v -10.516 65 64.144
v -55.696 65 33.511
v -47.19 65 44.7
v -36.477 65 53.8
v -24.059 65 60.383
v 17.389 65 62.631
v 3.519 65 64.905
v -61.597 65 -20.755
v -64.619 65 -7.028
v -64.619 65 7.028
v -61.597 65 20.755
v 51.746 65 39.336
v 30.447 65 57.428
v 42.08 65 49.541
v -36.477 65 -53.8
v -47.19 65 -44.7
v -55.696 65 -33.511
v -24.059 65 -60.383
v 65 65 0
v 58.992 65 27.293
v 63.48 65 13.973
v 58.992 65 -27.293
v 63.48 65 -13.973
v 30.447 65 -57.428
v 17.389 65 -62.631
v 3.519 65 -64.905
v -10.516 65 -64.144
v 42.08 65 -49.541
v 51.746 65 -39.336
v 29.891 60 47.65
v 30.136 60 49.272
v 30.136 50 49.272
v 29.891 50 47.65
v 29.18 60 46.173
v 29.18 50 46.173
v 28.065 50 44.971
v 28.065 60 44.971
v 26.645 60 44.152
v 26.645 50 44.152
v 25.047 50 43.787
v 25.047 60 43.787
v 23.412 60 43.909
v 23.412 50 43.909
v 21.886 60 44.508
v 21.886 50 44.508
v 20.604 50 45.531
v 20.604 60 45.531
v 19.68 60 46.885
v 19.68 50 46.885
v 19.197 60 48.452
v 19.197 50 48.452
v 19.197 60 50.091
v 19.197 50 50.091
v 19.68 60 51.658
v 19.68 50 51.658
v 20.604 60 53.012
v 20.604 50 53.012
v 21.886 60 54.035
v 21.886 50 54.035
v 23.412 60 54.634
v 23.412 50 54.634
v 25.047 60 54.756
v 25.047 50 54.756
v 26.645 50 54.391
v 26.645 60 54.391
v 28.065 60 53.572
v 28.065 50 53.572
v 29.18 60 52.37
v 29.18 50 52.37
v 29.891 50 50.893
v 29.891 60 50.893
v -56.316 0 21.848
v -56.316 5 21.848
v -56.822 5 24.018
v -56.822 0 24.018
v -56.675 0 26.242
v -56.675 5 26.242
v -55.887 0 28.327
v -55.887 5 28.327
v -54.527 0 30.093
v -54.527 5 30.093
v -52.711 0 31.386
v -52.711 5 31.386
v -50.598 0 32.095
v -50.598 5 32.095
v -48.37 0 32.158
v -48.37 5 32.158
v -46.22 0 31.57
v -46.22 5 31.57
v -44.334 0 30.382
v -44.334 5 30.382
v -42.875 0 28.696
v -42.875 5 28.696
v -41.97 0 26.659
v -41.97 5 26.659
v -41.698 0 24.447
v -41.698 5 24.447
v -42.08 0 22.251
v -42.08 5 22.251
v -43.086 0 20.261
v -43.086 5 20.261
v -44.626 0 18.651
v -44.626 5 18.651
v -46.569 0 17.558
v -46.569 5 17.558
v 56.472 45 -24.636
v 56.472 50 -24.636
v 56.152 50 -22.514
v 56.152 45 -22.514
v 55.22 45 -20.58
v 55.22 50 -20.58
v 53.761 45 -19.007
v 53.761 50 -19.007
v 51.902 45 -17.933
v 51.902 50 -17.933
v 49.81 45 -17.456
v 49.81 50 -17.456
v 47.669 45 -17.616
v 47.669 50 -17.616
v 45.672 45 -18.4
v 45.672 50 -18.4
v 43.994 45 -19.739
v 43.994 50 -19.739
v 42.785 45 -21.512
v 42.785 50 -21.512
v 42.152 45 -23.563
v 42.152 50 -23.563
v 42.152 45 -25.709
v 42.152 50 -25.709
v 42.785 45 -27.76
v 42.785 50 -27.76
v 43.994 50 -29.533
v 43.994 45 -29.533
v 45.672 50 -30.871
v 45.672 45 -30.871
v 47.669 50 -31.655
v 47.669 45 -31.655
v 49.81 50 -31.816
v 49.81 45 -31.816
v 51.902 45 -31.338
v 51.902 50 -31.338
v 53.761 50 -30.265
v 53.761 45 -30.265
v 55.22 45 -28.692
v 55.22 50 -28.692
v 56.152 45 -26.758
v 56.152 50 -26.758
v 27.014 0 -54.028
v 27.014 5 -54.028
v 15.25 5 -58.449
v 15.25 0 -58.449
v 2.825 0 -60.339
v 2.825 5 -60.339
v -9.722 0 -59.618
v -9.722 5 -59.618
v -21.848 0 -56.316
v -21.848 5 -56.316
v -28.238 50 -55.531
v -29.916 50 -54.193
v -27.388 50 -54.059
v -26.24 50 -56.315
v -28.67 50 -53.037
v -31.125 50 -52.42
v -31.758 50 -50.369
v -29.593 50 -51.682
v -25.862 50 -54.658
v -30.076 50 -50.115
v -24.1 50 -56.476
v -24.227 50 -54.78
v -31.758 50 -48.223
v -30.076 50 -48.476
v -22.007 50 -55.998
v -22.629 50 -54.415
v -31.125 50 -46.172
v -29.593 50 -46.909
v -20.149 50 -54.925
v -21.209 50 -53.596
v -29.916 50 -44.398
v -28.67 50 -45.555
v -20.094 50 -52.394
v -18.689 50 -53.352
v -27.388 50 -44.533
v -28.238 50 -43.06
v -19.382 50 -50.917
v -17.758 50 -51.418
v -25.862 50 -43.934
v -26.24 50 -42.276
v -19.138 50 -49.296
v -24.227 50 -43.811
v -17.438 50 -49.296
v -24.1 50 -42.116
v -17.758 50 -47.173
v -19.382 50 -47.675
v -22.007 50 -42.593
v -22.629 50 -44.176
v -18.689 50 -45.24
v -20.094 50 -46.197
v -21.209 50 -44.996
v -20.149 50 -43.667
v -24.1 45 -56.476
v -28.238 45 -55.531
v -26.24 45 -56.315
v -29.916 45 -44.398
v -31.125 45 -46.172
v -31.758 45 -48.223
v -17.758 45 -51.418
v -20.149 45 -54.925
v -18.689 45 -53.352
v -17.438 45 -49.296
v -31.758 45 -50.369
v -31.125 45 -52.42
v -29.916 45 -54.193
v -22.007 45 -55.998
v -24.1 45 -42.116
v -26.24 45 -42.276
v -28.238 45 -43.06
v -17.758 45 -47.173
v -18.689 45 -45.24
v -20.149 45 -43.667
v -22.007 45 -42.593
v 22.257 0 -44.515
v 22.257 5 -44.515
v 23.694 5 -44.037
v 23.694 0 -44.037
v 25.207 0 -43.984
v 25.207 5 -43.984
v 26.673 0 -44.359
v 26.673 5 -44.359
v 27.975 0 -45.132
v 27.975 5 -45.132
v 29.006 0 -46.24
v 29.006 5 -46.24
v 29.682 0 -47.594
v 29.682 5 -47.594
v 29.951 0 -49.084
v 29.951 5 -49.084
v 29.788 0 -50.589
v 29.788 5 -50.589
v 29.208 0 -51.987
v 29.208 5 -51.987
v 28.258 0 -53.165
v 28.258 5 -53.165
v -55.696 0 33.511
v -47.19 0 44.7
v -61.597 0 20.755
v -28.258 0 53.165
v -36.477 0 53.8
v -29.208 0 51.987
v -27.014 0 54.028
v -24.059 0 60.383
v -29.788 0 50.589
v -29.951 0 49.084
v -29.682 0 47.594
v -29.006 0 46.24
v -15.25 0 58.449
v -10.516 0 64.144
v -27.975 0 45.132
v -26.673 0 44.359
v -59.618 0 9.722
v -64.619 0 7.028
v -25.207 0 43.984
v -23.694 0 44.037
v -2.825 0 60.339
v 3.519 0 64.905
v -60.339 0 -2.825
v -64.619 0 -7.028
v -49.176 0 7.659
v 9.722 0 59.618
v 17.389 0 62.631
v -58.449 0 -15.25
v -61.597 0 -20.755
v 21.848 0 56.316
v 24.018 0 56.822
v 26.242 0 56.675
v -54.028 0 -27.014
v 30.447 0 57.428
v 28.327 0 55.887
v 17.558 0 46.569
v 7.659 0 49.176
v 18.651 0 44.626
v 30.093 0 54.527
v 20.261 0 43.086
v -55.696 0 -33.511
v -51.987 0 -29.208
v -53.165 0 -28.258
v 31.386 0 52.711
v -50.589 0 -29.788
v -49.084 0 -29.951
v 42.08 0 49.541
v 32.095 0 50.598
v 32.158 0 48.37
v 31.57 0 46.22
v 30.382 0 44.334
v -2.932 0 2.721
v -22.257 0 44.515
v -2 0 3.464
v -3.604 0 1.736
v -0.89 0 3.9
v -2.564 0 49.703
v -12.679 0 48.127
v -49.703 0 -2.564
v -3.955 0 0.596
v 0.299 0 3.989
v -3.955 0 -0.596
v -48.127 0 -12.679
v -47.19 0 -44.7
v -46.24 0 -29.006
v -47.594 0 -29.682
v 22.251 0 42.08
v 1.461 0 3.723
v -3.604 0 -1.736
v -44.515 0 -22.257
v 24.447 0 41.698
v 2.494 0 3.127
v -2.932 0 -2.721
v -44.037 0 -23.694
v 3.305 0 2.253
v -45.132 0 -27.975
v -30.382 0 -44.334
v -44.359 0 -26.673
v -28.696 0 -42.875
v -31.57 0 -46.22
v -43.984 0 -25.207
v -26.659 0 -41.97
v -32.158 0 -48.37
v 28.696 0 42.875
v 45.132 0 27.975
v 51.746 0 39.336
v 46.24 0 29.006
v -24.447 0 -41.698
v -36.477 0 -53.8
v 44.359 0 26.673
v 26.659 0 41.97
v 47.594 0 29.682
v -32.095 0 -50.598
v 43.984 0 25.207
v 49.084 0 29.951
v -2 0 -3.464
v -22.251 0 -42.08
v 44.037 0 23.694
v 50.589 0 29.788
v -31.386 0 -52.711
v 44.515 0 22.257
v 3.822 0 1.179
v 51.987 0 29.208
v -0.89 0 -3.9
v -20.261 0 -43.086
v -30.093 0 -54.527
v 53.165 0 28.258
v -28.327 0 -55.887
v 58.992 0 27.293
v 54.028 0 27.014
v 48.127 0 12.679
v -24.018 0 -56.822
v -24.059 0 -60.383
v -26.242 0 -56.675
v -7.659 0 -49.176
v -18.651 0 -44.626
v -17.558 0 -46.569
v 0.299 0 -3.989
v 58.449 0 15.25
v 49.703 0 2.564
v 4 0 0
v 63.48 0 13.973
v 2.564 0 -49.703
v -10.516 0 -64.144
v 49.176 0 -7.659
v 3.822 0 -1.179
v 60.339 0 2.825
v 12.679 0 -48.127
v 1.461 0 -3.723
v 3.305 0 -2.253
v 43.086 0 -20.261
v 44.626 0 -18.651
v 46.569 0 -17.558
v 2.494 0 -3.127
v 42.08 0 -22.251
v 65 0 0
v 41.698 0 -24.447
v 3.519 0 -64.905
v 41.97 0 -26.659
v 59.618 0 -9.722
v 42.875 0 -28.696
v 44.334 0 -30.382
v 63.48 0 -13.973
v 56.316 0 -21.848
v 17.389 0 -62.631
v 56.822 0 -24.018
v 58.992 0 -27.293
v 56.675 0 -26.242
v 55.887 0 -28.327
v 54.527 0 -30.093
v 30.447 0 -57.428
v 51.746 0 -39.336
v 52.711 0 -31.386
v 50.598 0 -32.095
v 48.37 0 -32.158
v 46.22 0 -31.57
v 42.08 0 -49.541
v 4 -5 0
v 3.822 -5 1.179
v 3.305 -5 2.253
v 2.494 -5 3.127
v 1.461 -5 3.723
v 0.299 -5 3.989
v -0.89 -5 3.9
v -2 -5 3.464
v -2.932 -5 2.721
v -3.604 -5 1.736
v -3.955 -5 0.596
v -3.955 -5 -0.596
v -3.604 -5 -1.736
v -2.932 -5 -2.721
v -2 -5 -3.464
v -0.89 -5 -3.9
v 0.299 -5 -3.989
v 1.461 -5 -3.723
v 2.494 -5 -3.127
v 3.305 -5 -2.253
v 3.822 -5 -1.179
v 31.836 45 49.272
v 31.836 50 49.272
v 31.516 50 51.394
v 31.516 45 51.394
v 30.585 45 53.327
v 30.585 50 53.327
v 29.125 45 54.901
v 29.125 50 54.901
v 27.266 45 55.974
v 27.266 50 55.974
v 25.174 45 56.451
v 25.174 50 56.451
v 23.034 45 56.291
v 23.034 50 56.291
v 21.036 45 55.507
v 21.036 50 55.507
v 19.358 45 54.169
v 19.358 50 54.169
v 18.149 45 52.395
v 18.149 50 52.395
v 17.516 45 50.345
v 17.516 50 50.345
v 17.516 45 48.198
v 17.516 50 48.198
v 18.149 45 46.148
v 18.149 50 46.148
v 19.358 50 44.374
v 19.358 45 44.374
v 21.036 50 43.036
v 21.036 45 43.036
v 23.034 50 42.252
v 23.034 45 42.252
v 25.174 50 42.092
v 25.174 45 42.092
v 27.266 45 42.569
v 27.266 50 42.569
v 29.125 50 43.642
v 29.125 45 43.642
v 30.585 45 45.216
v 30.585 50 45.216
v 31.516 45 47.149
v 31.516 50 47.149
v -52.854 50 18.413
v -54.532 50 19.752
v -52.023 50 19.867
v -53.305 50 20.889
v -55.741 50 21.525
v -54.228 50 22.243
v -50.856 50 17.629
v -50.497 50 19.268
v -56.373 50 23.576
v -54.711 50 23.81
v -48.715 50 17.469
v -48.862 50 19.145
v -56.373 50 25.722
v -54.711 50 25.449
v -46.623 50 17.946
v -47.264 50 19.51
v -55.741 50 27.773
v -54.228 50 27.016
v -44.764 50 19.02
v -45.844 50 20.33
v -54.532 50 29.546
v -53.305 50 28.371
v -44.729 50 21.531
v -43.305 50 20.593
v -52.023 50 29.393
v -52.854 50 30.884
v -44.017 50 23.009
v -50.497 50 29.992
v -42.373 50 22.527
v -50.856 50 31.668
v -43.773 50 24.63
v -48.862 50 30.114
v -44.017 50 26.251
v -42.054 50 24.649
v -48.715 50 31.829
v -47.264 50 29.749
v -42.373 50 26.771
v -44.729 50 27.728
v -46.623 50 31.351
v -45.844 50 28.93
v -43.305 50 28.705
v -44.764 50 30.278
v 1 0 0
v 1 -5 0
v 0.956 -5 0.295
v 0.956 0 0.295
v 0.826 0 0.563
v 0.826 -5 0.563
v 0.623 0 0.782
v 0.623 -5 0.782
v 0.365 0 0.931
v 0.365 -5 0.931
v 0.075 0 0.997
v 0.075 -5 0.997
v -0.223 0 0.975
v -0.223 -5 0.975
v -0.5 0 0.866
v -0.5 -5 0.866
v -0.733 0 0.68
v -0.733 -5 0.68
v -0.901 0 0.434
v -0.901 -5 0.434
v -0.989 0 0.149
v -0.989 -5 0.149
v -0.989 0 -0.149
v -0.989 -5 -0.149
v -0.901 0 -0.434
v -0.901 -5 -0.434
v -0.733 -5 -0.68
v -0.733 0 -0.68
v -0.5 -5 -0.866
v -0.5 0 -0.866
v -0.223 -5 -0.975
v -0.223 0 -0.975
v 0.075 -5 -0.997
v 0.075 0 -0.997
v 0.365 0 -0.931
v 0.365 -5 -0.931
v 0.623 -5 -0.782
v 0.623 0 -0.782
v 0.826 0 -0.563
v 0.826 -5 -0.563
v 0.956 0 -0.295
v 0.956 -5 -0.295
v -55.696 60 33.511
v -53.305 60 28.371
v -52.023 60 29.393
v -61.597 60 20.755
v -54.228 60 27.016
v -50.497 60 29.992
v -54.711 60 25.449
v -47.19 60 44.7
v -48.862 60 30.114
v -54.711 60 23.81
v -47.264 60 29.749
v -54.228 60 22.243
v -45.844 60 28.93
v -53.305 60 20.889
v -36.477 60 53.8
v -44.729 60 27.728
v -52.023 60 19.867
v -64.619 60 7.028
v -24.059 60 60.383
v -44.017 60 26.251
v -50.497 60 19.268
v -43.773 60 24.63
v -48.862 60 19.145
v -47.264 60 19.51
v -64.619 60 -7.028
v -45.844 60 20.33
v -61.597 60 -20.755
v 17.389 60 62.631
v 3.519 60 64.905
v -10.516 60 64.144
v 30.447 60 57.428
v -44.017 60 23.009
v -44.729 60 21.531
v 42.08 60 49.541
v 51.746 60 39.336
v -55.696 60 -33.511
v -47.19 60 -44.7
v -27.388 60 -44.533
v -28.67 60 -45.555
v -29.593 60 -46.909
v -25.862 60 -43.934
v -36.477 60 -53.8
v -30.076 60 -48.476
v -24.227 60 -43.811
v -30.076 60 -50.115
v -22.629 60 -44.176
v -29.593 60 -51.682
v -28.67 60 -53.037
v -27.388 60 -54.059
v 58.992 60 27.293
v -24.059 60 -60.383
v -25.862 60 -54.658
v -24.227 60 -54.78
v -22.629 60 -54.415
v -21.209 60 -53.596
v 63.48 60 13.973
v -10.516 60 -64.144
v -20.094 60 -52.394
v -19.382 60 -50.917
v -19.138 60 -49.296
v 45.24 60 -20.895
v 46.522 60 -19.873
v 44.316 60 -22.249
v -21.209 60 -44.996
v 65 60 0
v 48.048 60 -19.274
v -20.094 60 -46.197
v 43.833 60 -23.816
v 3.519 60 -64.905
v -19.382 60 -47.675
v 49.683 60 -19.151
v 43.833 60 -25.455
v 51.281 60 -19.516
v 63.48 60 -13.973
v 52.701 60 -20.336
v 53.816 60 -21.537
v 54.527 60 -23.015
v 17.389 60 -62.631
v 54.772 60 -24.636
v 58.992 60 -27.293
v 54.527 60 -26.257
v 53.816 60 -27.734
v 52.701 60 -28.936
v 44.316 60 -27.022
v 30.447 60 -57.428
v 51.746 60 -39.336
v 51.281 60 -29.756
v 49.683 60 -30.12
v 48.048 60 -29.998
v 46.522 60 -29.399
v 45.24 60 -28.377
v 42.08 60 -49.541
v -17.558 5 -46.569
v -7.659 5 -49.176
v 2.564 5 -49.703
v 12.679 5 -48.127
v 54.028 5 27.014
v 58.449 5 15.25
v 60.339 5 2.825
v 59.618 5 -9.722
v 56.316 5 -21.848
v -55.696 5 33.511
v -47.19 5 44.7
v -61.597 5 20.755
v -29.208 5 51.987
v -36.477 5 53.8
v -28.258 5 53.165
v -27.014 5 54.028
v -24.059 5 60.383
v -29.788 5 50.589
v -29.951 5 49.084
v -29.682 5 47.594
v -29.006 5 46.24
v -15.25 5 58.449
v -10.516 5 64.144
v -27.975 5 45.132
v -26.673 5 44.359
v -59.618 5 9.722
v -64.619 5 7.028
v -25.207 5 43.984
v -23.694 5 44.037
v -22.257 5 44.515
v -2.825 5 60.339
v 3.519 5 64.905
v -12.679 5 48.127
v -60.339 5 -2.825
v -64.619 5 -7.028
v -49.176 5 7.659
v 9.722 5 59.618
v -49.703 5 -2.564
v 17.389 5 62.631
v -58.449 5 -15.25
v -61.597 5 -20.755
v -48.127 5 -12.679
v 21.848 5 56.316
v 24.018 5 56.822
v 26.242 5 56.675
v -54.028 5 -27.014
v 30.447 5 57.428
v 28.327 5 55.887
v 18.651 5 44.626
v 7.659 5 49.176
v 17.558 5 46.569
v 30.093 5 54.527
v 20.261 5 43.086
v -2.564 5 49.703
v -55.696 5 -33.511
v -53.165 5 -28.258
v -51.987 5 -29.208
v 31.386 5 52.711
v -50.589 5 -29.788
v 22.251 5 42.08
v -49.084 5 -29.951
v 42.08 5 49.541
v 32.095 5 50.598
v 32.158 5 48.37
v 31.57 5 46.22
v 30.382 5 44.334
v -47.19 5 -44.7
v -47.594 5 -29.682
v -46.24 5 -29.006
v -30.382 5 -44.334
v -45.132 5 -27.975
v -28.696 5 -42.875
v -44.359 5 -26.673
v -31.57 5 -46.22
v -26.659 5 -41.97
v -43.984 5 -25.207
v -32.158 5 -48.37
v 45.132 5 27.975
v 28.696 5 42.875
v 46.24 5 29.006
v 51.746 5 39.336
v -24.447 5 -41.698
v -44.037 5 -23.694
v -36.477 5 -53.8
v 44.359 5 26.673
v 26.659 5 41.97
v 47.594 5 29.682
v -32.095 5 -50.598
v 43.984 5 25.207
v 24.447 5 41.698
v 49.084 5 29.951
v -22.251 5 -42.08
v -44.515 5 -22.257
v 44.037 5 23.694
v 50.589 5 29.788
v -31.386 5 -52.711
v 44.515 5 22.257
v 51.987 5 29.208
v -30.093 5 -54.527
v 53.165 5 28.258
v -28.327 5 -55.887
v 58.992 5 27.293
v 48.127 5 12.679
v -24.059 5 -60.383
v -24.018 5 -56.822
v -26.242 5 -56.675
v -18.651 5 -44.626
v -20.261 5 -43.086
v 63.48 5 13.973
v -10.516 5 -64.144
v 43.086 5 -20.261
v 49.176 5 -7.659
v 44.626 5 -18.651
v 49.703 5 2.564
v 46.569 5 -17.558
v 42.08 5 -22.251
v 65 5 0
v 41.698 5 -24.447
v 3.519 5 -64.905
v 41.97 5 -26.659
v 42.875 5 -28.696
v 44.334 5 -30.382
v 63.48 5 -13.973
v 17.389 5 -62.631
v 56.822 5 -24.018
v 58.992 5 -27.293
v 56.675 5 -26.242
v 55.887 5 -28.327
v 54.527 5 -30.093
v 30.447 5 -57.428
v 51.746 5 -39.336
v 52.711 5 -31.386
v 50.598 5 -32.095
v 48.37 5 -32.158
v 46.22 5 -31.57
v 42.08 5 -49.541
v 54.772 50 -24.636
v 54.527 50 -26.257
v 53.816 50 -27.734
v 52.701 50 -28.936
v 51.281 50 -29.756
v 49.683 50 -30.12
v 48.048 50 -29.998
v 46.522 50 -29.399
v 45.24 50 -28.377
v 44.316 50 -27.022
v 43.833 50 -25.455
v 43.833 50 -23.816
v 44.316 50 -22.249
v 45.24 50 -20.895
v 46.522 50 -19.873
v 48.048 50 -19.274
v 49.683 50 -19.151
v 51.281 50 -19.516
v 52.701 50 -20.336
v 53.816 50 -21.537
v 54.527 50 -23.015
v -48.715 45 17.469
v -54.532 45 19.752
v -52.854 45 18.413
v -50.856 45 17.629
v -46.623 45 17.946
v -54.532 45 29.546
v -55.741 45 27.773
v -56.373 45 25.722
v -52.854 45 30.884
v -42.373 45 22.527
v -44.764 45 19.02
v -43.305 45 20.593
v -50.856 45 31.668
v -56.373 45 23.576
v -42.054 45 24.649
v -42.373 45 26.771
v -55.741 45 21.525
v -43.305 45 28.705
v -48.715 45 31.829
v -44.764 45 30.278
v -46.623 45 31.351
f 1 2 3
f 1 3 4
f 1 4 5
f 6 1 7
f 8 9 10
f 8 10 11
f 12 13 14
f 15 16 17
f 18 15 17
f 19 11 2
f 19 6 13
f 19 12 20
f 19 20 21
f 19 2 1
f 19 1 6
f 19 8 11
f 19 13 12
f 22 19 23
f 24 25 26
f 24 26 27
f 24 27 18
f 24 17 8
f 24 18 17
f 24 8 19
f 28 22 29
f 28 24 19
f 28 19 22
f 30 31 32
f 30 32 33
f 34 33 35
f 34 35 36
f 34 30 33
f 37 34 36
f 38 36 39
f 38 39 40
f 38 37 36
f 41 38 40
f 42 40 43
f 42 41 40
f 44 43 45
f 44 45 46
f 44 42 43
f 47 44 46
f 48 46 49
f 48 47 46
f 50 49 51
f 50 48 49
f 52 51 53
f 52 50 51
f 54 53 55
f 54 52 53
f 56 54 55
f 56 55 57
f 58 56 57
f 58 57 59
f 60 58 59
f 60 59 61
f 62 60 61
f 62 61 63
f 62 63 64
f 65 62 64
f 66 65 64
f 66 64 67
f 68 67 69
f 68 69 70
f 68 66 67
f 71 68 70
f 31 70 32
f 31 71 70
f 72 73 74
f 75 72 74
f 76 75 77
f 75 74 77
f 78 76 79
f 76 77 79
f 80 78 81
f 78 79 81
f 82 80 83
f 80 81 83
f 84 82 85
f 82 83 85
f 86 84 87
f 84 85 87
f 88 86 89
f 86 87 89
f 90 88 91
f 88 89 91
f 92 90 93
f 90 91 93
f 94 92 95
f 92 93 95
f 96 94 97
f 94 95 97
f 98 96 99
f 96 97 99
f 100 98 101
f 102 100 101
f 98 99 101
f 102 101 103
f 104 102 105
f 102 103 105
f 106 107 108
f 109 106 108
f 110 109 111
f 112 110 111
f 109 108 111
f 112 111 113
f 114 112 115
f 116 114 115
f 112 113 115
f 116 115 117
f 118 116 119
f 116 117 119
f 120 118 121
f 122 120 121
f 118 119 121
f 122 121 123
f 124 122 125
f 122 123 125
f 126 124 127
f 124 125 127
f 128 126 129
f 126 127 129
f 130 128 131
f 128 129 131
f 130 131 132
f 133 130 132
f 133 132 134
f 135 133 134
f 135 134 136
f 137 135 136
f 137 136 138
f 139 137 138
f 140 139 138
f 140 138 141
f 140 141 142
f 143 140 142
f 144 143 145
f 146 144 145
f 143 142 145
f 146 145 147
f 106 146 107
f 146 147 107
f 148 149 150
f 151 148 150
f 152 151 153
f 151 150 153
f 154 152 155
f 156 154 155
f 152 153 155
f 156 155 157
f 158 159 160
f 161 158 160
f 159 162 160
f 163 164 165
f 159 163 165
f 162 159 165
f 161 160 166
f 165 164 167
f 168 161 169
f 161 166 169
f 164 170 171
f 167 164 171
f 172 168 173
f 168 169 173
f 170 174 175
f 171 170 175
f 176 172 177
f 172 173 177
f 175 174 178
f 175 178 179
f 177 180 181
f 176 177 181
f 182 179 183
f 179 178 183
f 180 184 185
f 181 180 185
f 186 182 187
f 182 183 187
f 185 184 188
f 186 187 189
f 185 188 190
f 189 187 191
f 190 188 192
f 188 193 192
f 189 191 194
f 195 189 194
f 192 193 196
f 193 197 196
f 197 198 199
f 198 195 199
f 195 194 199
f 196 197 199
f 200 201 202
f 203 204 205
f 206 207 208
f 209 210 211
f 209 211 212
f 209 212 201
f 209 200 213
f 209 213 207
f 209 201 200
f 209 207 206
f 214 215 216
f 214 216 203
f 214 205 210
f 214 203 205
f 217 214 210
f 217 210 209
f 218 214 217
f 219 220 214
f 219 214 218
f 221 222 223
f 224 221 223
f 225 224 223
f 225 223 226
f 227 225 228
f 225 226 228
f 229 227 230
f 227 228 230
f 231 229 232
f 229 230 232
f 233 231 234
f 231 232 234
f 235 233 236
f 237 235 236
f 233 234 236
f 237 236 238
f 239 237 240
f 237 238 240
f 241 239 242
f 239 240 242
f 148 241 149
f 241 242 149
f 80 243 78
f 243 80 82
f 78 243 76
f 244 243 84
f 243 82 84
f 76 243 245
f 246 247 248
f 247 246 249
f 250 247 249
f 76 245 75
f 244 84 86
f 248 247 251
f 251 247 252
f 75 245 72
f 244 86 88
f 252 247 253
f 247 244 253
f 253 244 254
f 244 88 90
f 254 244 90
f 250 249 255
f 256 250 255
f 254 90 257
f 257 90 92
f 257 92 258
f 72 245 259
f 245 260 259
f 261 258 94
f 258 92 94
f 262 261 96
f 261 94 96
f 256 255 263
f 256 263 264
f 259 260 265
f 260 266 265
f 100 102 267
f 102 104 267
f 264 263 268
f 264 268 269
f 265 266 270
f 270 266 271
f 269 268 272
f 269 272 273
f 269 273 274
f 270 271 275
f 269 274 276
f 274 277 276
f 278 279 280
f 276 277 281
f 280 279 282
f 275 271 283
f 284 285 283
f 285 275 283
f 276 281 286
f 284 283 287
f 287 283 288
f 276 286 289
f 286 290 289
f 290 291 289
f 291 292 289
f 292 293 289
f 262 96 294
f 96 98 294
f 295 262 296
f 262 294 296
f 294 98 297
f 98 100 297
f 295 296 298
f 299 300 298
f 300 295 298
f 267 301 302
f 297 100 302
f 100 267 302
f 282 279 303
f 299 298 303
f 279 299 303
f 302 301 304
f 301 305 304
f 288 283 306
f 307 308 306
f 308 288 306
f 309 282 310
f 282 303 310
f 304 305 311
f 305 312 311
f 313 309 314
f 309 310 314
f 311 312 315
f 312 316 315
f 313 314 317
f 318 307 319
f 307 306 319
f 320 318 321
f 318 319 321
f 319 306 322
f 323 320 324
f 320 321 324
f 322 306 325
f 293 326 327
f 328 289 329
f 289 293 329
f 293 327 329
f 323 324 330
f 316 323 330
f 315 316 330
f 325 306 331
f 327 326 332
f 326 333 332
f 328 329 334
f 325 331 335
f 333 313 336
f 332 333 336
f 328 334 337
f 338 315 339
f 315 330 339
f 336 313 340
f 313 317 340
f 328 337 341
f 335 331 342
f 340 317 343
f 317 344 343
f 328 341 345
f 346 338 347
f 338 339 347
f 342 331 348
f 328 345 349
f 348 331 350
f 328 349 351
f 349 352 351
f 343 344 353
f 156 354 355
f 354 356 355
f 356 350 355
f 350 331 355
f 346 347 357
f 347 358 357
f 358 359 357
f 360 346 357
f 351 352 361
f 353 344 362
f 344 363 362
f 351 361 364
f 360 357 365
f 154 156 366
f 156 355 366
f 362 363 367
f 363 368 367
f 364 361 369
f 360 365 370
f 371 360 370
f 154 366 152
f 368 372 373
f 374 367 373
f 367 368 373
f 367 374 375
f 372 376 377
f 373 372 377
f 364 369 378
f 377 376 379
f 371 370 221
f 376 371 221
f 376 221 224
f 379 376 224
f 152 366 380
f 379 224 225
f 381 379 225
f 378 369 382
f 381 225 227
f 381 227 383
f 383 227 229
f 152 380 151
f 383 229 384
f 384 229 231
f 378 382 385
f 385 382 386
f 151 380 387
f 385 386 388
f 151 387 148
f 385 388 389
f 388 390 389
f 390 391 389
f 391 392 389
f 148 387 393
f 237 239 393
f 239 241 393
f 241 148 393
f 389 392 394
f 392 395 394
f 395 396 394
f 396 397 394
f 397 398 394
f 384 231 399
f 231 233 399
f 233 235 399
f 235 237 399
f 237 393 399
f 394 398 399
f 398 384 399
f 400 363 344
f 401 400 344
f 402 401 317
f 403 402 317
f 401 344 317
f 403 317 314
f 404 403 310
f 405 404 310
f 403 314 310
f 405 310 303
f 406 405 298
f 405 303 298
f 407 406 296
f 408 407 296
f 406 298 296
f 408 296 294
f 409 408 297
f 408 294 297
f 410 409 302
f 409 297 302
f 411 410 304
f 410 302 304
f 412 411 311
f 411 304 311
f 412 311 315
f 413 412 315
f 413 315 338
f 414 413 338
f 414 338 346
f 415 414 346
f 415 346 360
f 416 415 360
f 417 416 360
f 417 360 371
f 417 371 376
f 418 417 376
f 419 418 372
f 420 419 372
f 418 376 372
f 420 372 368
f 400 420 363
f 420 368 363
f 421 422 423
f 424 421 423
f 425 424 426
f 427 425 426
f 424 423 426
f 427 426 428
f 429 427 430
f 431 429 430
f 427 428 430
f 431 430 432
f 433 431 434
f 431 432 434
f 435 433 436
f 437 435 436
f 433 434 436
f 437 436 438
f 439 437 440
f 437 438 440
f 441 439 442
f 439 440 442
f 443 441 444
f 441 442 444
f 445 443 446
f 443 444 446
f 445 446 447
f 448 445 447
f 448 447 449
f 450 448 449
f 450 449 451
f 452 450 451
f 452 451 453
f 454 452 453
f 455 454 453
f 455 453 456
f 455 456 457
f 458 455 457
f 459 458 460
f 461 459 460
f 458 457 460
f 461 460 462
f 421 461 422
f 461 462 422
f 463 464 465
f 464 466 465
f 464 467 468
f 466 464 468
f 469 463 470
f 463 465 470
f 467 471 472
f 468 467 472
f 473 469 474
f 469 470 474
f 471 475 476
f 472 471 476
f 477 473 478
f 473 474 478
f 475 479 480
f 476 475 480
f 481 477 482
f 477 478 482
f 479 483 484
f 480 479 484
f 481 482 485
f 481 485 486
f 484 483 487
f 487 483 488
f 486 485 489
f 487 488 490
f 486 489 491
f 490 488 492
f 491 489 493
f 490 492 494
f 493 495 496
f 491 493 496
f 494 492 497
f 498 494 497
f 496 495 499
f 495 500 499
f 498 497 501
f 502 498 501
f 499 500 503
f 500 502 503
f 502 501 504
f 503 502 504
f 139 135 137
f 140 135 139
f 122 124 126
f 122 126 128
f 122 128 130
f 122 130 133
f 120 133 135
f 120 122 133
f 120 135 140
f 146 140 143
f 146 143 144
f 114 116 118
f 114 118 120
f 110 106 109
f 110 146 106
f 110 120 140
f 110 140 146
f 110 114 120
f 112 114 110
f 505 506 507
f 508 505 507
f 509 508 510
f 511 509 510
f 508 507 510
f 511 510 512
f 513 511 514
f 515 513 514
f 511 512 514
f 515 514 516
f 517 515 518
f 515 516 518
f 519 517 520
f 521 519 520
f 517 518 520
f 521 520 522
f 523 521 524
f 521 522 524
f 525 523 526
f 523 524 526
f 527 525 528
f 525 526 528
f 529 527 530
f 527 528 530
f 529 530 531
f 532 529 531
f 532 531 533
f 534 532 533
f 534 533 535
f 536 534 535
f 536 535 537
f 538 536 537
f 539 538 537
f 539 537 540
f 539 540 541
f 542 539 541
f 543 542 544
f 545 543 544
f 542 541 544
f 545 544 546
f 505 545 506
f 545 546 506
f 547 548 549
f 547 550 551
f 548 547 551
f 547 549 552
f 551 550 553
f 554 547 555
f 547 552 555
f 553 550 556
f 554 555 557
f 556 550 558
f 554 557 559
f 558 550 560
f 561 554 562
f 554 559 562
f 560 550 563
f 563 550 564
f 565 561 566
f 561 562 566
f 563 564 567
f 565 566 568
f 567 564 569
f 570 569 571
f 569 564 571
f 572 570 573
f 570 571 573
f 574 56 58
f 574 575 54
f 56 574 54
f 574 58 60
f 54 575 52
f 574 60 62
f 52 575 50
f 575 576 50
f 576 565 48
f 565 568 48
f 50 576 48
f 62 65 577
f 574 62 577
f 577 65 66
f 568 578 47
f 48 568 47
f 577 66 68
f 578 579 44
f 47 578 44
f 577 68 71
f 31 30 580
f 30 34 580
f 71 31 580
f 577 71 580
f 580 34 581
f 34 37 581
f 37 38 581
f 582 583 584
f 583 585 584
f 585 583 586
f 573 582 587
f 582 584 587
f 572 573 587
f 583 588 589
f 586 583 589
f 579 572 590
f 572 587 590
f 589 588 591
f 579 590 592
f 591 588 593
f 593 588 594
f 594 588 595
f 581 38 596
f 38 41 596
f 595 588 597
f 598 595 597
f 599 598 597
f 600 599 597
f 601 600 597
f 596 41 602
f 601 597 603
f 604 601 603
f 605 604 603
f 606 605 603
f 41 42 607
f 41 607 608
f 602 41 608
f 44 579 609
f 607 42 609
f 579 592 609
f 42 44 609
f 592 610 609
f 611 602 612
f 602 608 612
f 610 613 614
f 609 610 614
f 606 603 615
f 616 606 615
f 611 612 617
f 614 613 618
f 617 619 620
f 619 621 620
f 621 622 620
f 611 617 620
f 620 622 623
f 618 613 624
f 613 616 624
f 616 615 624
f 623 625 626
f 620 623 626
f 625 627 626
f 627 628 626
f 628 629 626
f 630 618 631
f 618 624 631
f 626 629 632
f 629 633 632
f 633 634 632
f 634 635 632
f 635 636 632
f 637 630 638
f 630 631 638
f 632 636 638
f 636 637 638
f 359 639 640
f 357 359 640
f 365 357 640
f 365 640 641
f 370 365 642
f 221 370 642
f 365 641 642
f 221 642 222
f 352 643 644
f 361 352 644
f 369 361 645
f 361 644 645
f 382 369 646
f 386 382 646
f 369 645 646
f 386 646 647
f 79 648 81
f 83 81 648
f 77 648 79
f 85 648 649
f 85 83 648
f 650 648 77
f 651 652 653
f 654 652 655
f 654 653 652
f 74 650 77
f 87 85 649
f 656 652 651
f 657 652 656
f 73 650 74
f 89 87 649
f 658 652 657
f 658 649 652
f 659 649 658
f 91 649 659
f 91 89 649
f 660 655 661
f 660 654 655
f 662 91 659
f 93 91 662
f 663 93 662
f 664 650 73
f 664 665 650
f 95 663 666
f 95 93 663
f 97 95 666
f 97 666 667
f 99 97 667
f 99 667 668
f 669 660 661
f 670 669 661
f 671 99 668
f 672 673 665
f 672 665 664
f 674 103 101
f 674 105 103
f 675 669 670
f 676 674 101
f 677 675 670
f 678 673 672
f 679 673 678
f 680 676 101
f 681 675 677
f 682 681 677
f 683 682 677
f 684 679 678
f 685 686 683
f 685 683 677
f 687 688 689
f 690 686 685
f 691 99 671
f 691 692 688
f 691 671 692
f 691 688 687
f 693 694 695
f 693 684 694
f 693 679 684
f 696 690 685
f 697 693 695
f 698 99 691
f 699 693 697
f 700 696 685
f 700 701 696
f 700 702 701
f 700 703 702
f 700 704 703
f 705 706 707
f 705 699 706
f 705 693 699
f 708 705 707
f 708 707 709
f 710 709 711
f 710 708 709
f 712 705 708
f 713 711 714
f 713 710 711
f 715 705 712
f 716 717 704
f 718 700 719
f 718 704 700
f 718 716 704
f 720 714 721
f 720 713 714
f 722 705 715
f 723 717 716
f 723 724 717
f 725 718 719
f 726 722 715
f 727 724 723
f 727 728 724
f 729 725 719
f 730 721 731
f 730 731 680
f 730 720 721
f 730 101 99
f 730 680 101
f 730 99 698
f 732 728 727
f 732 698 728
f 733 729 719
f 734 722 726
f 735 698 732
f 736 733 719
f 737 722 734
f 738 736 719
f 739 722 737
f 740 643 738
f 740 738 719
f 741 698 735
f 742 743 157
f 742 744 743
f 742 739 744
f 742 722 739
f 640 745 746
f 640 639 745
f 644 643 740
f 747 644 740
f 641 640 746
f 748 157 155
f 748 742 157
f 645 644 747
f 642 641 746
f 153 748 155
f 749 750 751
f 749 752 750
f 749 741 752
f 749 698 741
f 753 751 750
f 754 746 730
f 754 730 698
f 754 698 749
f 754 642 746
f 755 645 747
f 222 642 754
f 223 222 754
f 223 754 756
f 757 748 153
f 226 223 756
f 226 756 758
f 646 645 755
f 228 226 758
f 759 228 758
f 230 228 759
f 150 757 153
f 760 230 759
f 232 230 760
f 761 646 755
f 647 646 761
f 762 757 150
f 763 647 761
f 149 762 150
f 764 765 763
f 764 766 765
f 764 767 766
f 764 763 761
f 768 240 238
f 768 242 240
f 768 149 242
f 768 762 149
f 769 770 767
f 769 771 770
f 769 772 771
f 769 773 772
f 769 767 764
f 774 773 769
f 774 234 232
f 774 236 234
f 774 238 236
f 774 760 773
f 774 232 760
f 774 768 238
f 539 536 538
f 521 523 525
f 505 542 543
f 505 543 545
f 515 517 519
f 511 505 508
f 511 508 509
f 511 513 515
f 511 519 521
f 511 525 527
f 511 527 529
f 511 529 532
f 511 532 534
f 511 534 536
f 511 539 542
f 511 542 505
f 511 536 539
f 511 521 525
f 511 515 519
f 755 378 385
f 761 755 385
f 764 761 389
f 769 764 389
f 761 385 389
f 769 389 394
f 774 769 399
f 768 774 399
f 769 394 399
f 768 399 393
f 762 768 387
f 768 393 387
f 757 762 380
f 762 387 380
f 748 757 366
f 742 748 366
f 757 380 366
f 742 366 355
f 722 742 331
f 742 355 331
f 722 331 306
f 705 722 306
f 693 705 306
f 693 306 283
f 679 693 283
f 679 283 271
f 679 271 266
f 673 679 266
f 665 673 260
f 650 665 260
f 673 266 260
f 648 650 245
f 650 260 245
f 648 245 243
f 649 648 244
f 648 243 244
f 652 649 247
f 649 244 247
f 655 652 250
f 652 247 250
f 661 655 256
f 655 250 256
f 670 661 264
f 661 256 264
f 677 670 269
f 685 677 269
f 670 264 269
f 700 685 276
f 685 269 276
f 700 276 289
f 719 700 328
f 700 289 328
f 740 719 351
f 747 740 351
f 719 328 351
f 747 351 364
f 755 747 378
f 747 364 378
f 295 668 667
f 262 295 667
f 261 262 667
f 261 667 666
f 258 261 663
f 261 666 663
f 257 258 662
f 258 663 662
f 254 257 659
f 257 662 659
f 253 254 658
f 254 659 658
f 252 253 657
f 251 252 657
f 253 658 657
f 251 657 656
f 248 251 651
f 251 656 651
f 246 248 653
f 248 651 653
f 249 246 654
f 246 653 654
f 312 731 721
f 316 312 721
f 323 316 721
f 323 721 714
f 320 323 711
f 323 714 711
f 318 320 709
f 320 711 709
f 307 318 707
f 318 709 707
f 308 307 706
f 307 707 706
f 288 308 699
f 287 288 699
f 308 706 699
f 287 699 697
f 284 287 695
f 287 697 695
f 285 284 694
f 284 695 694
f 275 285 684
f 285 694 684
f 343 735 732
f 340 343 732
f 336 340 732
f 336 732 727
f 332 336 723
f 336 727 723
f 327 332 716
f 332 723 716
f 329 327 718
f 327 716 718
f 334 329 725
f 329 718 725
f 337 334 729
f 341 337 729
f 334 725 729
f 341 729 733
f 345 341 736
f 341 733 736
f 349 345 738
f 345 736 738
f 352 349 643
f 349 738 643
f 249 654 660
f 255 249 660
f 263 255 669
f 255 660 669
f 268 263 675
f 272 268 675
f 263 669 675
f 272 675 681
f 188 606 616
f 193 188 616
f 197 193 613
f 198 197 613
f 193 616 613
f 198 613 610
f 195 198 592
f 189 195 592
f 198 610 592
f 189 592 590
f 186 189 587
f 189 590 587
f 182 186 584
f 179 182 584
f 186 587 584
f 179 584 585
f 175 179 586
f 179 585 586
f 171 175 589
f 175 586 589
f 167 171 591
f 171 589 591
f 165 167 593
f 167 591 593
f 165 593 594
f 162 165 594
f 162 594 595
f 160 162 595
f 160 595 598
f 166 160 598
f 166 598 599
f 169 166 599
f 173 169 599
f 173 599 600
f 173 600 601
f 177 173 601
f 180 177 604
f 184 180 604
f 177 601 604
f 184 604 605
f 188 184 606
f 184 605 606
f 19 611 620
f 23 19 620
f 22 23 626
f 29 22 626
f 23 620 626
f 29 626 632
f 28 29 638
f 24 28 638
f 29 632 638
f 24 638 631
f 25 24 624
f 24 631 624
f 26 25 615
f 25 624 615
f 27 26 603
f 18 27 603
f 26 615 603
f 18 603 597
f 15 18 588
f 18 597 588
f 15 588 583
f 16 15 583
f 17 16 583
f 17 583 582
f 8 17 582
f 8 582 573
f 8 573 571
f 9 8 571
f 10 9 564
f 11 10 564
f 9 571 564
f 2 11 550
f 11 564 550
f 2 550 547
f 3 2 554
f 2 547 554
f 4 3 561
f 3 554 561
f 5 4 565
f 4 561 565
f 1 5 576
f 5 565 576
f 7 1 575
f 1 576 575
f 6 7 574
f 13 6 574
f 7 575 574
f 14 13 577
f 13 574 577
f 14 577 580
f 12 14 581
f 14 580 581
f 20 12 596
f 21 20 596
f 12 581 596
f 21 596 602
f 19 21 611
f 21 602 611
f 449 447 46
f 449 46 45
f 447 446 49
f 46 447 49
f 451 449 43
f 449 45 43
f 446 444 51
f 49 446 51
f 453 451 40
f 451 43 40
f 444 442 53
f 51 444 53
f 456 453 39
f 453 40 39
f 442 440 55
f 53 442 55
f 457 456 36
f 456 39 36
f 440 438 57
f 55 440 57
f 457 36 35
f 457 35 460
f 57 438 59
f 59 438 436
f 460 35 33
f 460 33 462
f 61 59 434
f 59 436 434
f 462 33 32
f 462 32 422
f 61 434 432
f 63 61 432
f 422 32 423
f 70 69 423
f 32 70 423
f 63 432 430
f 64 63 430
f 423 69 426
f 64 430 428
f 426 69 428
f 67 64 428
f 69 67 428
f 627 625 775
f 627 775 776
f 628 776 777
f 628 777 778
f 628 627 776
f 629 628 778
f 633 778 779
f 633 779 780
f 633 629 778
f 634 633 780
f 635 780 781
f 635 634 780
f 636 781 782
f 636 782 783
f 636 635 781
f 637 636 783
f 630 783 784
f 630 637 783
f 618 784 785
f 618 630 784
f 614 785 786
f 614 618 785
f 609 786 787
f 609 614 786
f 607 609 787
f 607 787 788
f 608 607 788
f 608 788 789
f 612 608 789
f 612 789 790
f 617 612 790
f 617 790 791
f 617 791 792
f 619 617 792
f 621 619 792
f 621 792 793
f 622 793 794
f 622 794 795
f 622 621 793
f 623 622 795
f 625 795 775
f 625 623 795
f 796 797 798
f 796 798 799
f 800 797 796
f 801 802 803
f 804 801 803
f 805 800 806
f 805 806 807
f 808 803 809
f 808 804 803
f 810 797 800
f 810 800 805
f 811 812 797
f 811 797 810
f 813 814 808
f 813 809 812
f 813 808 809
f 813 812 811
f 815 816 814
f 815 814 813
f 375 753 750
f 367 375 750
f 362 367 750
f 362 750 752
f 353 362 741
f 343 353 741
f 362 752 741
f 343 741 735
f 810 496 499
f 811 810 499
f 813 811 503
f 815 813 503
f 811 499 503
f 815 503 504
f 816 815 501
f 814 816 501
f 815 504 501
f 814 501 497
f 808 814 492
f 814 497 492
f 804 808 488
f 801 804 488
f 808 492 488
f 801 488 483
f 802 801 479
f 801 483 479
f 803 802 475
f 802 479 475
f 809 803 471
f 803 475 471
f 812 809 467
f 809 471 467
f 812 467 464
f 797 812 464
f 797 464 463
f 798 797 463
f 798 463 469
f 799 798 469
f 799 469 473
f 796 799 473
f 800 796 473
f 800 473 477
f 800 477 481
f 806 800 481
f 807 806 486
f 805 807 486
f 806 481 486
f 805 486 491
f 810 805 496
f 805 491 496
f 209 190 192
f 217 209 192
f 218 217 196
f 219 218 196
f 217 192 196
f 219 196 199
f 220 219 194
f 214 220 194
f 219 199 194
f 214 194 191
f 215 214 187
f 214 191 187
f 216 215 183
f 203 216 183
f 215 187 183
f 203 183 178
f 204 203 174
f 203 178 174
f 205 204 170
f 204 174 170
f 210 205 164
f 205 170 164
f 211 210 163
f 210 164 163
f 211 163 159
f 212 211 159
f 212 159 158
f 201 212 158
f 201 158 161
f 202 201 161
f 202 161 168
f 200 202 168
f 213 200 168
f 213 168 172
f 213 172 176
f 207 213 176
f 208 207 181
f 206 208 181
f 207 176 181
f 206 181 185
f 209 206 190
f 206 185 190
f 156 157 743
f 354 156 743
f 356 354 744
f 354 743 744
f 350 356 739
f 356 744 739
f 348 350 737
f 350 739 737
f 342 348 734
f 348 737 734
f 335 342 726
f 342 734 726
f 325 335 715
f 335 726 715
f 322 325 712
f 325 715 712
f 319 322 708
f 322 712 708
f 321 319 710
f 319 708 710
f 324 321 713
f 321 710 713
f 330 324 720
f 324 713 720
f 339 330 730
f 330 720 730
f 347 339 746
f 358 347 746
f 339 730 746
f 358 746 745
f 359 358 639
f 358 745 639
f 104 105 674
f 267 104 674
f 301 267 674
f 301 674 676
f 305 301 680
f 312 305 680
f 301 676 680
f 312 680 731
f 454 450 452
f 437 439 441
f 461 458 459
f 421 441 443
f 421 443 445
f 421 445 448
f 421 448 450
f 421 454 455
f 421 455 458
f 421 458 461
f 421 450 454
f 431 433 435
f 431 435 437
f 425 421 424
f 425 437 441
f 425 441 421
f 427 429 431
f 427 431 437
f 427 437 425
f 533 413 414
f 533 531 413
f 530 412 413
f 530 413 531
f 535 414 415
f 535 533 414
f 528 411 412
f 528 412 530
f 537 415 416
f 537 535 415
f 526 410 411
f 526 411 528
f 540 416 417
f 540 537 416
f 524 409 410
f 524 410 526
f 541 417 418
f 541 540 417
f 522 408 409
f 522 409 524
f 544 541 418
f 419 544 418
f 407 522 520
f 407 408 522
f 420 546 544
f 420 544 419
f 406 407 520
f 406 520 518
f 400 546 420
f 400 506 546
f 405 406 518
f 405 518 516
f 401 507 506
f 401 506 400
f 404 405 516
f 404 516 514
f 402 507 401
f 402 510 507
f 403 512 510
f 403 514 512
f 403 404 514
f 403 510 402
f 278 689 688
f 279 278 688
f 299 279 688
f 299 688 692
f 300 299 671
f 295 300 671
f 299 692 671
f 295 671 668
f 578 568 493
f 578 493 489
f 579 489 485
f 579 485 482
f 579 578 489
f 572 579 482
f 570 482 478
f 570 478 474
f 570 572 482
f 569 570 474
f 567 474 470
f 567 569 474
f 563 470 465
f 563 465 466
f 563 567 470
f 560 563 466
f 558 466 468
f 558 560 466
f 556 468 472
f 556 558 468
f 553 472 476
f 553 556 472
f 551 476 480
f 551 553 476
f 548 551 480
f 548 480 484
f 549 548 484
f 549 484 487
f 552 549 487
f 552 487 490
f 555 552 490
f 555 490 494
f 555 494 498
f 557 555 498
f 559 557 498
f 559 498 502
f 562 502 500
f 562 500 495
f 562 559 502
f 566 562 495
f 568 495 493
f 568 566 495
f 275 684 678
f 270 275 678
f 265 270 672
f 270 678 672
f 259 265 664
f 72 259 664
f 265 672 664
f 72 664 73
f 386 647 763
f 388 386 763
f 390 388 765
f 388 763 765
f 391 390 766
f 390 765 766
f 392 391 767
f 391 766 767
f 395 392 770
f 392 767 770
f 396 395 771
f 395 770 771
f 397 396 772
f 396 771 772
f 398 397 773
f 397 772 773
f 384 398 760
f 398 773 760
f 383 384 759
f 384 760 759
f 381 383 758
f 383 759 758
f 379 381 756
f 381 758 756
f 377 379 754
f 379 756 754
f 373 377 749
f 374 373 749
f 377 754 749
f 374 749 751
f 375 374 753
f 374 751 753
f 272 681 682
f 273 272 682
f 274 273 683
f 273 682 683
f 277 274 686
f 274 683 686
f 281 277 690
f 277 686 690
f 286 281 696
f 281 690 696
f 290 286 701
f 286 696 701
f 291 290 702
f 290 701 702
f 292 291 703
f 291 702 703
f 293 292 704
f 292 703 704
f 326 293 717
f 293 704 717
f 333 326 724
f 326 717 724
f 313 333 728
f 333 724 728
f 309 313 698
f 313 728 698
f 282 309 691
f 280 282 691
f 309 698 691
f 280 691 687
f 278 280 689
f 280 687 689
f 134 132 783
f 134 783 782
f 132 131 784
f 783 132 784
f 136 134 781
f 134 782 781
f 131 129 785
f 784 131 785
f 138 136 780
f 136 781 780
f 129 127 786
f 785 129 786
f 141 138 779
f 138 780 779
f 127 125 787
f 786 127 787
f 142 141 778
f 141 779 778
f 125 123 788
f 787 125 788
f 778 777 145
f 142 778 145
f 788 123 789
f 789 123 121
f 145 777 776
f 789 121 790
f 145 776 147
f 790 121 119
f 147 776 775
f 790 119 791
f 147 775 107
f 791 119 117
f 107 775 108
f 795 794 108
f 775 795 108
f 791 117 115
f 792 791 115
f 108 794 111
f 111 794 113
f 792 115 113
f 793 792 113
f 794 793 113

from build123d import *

# Parameters (mm, degrees)
SKETCH1_R            = 65
BOSS_EXTRUDE1_DEPTH  = 5
CUT_EXTRUDE2_DEPTH   = 5
SKETCH10_R           = 65
BOSS_EXTRUDE3_DEPTH  = 5
SKETCH14_R           = 5.5
BOSS_EXTRUDE4_DEPTH  = 10
SKETCH18_R           = 7.2
BOSS_EXTRUDE5_DEPTH  = 5
SKETCH21_R           = 5.5
BOSS_EXTRUDE6_DEPTH  = 10
SKETCH25_R           = 7.2
BOSS_EXTRUDE7_DEPTH  = 5
SKETCH27_R           = 5.5
BOSS_EXTRUDE9_DEPTH  = 10
SKETCH28_R           = 7.2
BOSS_EXTRUDE10_DEPTH = 5
SKETCH29_R           = 4
BOSS_EXTRUDE11_DEPTH = 5
SKETCH32_R           = 1
CUT_EXTRUDE4_DEPTH   = 5


with BuildPart() as part:
    # Sketch1 → Boss-Extrude1 (new body)
    with BuildSketch(Plane(origin=(0, 0, 0), x_dir=(1, 0, 0), z_dir=(0, 1, 0))):
        Circle(SKETCH1_R)
    extrude(amount=BOSS_EXTRUDE1_DEPTH)

    # Sketch2 → Cut-Extrude2 (cut)
    with BuildSketch(Plane(origin=(0, 5, 0), x_dir=(1, 0, 0), z_dir=(0, 1, 0))):
        with BuildLine():
            ThreePointArc((-54.028155023, 27.014077511), (-60.339208175, 2.825221378), (-56.315967651, -21.847510303))
            ThreePointArc((-56.315967651, -21.847510303), (-46.21967139, -31.570094031), (-46.569142204, -17.557895678))
            ThreePointArc((-46.569142204, -17.557895678), (-49.703000748, 2.564453724), (-44.514848815, 22.257424407))
            ThreePointArc((-44.514848815, 22.257424407), (-46.893175367, 29.392404063), (-54.028155023, 27.014077511))
        make_face()
        with BuildLine():
            ThreePointArc((46.569142204, 17.557895678), (49.703000748, -2.564453724), (44.514848815, -22.257424407))
            ThreePointArc((44.514848815, -22.257424407), (46.893175367, -29.392404063), (54.028155023, -27.014077511))
            ThreePointArc((54.028155023, -27.014077511), (60.339208175, -2.825221378), (56.315967651, 21.847510303))
            ThreePointArc((56.315967651, 21.847510303), (46.21967139, 31.570094031), (46.569142204, 17.557895678))
        make_face()
        with BuildLine():
            ThreePointArc((-17.557895678, 46.569142204), (2.564453724, 49.703000748), (22.257424407, 44.514848815))
            ThreePointArc((22.257424407, 44.514848815), (29.392404063, 46.893175367), (27.014077511, 54.028155023))
            ThreePointArc((27.014077511, 54.028155023), (2.825221378, 60.339208175), (-21.847510303, 56.315967651))
            ThreePointArc((-21.847510303, 56.315967651), (-31.570094031, 46.21967139), (-17.557895678, 46.569142204))
        make_face()
        with BuildLine():
            ThreePointArc((17.557895678, -46.569142204), (-2.564453724, -49.703000748), (-22.257424407, -44.514848815))
            ThreePointArc((-22.257424407, -44.514848815), (-29.392404063, -46.893175367), (-27.014077511, -54.028155023))
            ThreePointArc((-27.014077511, -54.028155023), (-2.825221378, -60.339208175), (21.847510303, -56.315967651))
            ThreePointArc((21.847510303, -56.315967651), (31.570094031, -46.21967139), (17.557895678, -46.569142204))
        make_face()
    extrude(amount=-CUT_EXTRUDE2_DEPTH, mode=Mode.SUBTRACT)

    # Sketch29 → Boss-Extrude11 (add)
    with BuildSketch(Plane.XZ):
        Circle(SKETCH29_R)
    extrude(amount=BOSS_EXTRUDE11_DEPTH)

    # Sketch32 → Cut-Extrude4 (cut)
    with BuildSketch(Plane.XZ.offset(5)):
        Circle(SKETCH32_R)
    extrude(amount=-CUT_EXTRUDE4_DEPTH, mode=Mode.SUBTRACT)


with BuildPart() as body_2:
    # Sketch10 → Boss-Extrude3 (new body)
    with BuildSketch(Plane(origin=(0, 60, 0), x_dir=(1, 0, 0), z_dir=(0, 1, 0))):
        Circle(SKETCH10_R)
    extrude(amount=BOSS_EXTRUDE3_DEPTH)

    # Sketch14 → Boss-Extrude4 (add)
    with BuildSketch(Plane.XZ.offset(-60)):
        with Locations((-24.637923521, -49.295690328)):
            Circle(SKETCH14_R)
    extrude(amount=BOSS_EXTRUDE4_DEPTH)

    # Sketch18 → Boss-Extrude5 (add)
    with BuildSketch(Plane.XZ.offset(-50)):
        with Locations((-24.637923521, -49.295690328)):
            Circle(SKETCH18_R)
    extrude(amount=BOSS_EXTRUDE5_DEPTH)

    # Sketch21 → Boss-Extrude6 (add)
    with BuildSketch(Plane(origin=(0, 60, 0), x_dir=(1, 0, 0), z_dir=(0, 1, 0))):
        with Locations((-49.272878351, -24.629663863)):
            Circle(SKETCH21_R)
    extrude(amount=-BOSS_EXTRUDE6_DEPTH)

    # Sketch25 → Boss-Extrude7 (add)
    with BuildSketch(Plane.XZ.offset(-50)):
        with Locations((-49.253550208, 24.648775945)):
            Circle(SKETCH25_R)
    extrude(amount=BOSS_EXTRUDE7_DEPTH)

    # Sketch27 → Boss-Extrude9 (add)
    with BuildSketch(Plane(origin=(0, 60, 0), x_dir=(1, 0, 0), z_dir=(0, 1, 0))):
        with Locations((49.271501919, 24.635750959)):
            Circle(SKETCH27_R)
        with Locations((24.635750959, -49.271501919)):
            Circle(SKETCH27_R)
    extrude(amount=-BOSS_EXTRUDE9_DEPTH)

    # Sketch28 → Boss-Extrude10 (add)
    with BuildSketch(Plane.XZ.offset(-50)):
        with Locations((49.271501919, -24.635750959)):
            Circle(SKETCH28_R)
        with Locations((24.635750959, 49.271501919)):
            Circle(SKETCH28_R)
    extrude(amount=BOSS_EXTRUDE10_DEPTH)


solid = Compound([part.part, body_2.part])
